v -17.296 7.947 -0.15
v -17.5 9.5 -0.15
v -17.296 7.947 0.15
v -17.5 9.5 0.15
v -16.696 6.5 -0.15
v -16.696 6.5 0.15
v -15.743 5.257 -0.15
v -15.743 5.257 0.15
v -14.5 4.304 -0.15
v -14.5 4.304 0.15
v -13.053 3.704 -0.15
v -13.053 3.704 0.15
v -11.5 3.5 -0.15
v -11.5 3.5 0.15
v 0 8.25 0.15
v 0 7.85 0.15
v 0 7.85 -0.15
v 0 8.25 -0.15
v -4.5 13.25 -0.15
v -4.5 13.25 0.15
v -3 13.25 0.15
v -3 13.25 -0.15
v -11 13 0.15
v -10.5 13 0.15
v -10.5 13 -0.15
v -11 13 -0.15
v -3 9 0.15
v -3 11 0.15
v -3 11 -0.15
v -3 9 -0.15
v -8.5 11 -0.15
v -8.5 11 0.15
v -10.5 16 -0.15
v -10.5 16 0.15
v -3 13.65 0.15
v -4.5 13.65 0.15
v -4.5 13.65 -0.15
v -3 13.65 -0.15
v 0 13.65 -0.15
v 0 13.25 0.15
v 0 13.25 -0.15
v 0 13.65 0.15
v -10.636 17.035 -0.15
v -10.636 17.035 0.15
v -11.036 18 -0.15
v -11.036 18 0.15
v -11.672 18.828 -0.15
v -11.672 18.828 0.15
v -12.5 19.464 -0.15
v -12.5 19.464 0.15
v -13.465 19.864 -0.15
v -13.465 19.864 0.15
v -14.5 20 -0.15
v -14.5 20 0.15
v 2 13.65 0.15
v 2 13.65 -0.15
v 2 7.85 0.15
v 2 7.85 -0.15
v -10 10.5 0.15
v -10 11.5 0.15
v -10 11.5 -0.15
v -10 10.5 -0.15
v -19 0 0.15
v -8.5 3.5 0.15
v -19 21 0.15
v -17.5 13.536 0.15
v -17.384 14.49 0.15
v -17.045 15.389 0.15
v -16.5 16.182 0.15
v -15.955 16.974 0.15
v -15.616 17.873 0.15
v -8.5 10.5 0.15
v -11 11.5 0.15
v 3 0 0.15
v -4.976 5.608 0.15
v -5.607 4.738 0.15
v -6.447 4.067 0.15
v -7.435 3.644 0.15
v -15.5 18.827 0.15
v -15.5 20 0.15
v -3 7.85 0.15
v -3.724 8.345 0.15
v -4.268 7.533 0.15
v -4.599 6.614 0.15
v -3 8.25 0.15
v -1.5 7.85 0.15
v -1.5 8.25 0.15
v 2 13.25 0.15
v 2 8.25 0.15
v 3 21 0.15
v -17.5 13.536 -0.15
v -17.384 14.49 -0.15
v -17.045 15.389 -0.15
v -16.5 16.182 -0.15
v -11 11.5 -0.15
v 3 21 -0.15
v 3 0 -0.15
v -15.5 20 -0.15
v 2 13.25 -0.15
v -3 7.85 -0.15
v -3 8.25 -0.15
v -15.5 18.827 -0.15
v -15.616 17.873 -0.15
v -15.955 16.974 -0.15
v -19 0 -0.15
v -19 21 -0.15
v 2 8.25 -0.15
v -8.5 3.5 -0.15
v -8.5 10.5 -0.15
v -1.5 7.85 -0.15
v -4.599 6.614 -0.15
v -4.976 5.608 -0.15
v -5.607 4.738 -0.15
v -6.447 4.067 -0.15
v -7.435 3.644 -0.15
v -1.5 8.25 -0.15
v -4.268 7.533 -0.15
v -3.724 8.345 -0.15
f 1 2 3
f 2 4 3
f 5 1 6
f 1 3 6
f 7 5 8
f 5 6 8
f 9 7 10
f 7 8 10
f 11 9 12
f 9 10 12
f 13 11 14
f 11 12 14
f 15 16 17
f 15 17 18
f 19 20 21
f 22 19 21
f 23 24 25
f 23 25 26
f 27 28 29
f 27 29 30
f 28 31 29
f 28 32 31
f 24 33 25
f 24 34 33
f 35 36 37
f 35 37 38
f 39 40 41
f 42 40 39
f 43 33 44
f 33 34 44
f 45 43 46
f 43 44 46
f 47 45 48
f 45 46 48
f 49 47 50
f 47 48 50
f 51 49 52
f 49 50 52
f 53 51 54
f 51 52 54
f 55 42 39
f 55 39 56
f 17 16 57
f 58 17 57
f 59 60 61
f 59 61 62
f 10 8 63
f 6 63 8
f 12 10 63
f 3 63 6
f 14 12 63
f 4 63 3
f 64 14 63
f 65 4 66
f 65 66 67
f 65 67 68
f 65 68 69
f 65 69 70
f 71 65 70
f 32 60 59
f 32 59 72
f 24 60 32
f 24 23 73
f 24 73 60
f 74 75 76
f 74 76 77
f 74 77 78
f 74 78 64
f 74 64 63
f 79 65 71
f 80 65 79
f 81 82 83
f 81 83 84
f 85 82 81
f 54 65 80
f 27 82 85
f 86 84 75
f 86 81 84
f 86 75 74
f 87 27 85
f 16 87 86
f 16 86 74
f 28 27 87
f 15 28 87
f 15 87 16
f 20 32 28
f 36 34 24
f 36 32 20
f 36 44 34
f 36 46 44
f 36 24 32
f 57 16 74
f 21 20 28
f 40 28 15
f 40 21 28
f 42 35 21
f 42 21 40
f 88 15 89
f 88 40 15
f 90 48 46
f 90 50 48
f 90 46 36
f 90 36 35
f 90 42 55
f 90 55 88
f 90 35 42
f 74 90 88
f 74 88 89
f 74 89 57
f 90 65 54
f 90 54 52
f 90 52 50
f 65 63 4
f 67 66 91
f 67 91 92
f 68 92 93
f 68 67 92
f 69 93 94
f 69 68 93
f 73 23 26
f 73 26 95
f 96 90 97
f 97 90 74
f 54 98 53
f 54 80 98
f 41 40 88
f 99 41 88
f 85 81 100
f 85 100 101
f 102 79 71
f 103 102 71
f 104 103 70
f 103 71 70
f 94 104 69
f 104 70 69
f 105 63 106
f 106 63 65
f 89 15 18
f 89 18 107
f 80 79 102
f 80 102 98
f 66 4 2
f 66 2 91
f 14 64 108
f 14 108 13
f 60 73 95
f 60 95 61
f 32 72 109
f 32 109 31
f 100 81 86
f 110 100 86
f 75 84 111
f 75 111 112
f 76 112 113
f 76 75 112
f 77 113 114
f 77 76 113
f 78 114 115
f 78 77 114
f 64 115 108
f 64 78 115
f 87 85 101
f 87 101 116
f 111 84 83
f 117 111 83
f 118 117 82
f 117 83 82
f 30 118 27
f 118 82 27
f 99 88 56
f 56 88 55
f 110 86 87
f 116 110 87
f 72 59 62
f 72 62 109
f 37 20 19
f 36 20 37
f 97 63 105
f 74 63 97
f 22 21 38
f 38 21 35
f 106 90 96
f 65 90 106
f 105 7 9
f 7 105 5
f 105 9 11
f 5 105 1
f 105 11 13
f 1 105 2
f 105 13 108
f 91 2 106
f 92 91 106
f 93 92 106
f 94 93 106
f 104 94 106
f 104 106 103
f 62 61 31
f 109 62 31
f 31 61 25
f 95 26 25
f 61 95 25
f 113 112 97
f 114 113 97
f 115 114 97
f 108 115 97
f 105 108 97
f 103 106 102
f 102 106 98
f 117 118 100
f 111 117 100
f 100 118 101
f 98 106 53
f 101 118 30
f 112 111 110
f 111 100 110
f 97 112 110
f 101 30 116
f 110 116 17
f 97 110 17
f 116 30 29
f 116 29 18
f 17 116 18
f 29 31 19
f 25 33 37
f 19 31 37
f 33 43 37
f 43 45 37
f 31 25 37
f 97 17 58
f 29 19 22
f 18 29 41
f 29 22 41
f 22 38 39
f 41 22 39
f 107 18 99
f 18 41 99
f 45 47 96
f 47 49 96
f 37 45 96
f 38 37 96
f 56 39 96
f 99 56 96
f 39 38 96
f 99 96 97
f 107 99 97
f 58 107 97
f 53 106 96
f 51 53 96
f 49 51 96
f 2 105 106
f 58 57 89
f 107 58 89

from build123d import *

# Parameters (mm, degrees)
BOSS_EXTRUDE1_DEPTH = 0.15
FILLET3_R           = 6
FILLET4_R           = 4
FILLET5_R           = 4
FILLET7_R           = 4
SKETCH3_W           = 2
SKETCH3_H           = 0.4
SKETCH3_W_2         = 1.5
CUT_EXTRUDE1_DEPTH  = 29.321193478


with BuildPart() as part:
    # Sketch1 → Boss-Extrude1 (new, symmetric)
    with BuildSketch(Plane.XY):
        Polygon((0, 0), (-19, 0), (-19, 21), (0, 21), (3, 21), (3, 0), align=None)
        Polygon((-8.5, 11), (-3, 11), (-3, 9), (-4.5, 9), (-4.5, 3.5), (-17.5, 3.5), (-17.5, 17), (-15.5, 17), (-15.5, 20), (-10.5, 20), (-10.5, 13), (-11, 13), (-11, 11.5), (-10, 11.5), (-10, 10.5), (-8.5, 10.5), align=None, mode=Mode.SUBTRACT)
    extrude(amount=BOSS_EXTRUDE1_DEPTH, both=True)

    # Fillet3
    fillet3_edges = [part.edges().sort_by_distance(p)[0] for p in [
        (-17.5, 3.5, 0),
    ]]
    fillet(fillet3_edges, radius=FILLET3_R)

    # Fillet4
    # the kernel refuses this fillet: 4 mm, written as the material it adds along each edge
    with BuildSketch(Plane(origin=(-17.5, 17, 0.15), x_dir=(0, -1, 0), z_dir=(0, 0, -1))) as fillet4_piece_1:
        with BuildLine():
            CenterArc((3.464101615, -4), FILLET4_R, 90, 60)
            Line((0, -2), (-0.069282032, -1.96))
            ThreePointArc((-0.069282032, -1.96), (-0.08, -1), (-0.08, 0))
            Line((-0.08, 0), (0, 0.08))
            Line((0, 0.08), (3.464101615, 0.08))
            Line((3.464101615, 0.08), (3.464101615, 0))
        make_face()
    extrude(amount=0.3)
    with BuildSketch(Plane(origin=(-4.5, 3.5, 0.15), x_dir=(-1, 0, 0), z_dir=(0, 0, -1))) as fillet4_piece_2:
        with BuildLine():
            CenterArc((FILLET4_R, FILLET4_R), FILLET4_R, 180, 90)
            Line((0, FILLET4_R), (-FILLET4_R * 0.02, FILLET4_R))
            Line((-FILLET4_R * 0.02, FILLET4_R), (-FILLET4_R * 0.02, -FILLET4_R * 0.02))
            Line((-FILLET4_R * 0.02, -FILLET4_R * 0.02), (FILLET4_R, -FILLET4_R * 0.02))
            Line((FILLET4_R, -FILLET4_R * 0.02), (FILLET4_R, 0))
        make_face()
    extrude(amount=0.3)

    # Fillet5
    # the kernel refuses this fillet: 4 mm, written as the material it takes off along each edge
    with BuildSketch(Plane(origin=(-15.5, 17, 4.718502517), x_dir=(0, 1, 0), z_dir=(0, 0, -1))) as fillet5_piece_1:
        with BuildLine():
            CenterArc((1.827401007, -4), FILLET5_R, 90, 41.409622109)
            Line((-0.818350304, -1), (-0.87126533, -0.94))
            ThreePointArc((-0.87126533, -0.94), (-0.430439522, -0.482598297), (-0.069282032, 0.04))
            Line((-0.069282032, 0.04), (0, 0.08))
            Line((0, 0.08), (1.827401007, 0.08))
            Line((1.827401007, 0.08), (1.827401007, 0))
        make_face()
    extrude(amount=9.437005035, mode=Mode.SUBTRACT)
    with BuildSketch(Plane(origin=(-4.5, 9, 6.119736906), x_dir=(-0.041592927859064134, -0.9991346397518759, 0), z_dir=(0, 0, -1))) as fillet5_piece_2:
        with BuildLine():
            CenterArc((3.110715854, -3.934149167), FILLET5_R, 100.410842639, 42.081908104)
            Line((-0.062389392, -1.49870196), (-0.379699916, -1.255157239))
            ThreePointArc((-0.379699916, -1.255157239), (-0.430848552, -0.732713809), (-0.399653856, 0.016637171))
            Line((-0.399653856, 0.016637171), (0.016637171, 0.399653856))
            ThreePointArc((0.016637171, 0.399653856), (1.515339131, 0.337264464), (2.315612653, 0.393414917))
            Line((2.315612653, 0.393414917), (2.387894762, 0))
        make_face()
    extrude(amount=12.239473812, mode=Mode.SUBTRACT)

    # Fillet7
    fillet7_edges = [part.edges().sort_by_distance(p)[0] for p in [
        (-10.5, 20, 0),
    ]]
    fillet(fillet7_edges, radius=FILLET7_R)

    # Sketch3 → Cut-Extrude1 (cut, through all)
    with BuildSketch(Plane.XY.offset(0.15)):
        with Locations((1, 8.05)):
            Rectangle(SKETCH3_W, SKETCH3_H)
        with Locations((-2.25, 8.05)):
            Rectangle(SKETCH3_W_2, SKETCH3_H)
        with Locations((1, 13.45)):
            Rectangle(SKETCH3_W, SKETCH3_H)
        with Locations((-3.75, 13.45)):
            Rectangle(SKETCH3_W_2, SKETCH3_H)
    extrude(amount=-CUT_EXTRUDE1_DEPTH, mode=Mode.SUBTRACT)


solid = part.part
